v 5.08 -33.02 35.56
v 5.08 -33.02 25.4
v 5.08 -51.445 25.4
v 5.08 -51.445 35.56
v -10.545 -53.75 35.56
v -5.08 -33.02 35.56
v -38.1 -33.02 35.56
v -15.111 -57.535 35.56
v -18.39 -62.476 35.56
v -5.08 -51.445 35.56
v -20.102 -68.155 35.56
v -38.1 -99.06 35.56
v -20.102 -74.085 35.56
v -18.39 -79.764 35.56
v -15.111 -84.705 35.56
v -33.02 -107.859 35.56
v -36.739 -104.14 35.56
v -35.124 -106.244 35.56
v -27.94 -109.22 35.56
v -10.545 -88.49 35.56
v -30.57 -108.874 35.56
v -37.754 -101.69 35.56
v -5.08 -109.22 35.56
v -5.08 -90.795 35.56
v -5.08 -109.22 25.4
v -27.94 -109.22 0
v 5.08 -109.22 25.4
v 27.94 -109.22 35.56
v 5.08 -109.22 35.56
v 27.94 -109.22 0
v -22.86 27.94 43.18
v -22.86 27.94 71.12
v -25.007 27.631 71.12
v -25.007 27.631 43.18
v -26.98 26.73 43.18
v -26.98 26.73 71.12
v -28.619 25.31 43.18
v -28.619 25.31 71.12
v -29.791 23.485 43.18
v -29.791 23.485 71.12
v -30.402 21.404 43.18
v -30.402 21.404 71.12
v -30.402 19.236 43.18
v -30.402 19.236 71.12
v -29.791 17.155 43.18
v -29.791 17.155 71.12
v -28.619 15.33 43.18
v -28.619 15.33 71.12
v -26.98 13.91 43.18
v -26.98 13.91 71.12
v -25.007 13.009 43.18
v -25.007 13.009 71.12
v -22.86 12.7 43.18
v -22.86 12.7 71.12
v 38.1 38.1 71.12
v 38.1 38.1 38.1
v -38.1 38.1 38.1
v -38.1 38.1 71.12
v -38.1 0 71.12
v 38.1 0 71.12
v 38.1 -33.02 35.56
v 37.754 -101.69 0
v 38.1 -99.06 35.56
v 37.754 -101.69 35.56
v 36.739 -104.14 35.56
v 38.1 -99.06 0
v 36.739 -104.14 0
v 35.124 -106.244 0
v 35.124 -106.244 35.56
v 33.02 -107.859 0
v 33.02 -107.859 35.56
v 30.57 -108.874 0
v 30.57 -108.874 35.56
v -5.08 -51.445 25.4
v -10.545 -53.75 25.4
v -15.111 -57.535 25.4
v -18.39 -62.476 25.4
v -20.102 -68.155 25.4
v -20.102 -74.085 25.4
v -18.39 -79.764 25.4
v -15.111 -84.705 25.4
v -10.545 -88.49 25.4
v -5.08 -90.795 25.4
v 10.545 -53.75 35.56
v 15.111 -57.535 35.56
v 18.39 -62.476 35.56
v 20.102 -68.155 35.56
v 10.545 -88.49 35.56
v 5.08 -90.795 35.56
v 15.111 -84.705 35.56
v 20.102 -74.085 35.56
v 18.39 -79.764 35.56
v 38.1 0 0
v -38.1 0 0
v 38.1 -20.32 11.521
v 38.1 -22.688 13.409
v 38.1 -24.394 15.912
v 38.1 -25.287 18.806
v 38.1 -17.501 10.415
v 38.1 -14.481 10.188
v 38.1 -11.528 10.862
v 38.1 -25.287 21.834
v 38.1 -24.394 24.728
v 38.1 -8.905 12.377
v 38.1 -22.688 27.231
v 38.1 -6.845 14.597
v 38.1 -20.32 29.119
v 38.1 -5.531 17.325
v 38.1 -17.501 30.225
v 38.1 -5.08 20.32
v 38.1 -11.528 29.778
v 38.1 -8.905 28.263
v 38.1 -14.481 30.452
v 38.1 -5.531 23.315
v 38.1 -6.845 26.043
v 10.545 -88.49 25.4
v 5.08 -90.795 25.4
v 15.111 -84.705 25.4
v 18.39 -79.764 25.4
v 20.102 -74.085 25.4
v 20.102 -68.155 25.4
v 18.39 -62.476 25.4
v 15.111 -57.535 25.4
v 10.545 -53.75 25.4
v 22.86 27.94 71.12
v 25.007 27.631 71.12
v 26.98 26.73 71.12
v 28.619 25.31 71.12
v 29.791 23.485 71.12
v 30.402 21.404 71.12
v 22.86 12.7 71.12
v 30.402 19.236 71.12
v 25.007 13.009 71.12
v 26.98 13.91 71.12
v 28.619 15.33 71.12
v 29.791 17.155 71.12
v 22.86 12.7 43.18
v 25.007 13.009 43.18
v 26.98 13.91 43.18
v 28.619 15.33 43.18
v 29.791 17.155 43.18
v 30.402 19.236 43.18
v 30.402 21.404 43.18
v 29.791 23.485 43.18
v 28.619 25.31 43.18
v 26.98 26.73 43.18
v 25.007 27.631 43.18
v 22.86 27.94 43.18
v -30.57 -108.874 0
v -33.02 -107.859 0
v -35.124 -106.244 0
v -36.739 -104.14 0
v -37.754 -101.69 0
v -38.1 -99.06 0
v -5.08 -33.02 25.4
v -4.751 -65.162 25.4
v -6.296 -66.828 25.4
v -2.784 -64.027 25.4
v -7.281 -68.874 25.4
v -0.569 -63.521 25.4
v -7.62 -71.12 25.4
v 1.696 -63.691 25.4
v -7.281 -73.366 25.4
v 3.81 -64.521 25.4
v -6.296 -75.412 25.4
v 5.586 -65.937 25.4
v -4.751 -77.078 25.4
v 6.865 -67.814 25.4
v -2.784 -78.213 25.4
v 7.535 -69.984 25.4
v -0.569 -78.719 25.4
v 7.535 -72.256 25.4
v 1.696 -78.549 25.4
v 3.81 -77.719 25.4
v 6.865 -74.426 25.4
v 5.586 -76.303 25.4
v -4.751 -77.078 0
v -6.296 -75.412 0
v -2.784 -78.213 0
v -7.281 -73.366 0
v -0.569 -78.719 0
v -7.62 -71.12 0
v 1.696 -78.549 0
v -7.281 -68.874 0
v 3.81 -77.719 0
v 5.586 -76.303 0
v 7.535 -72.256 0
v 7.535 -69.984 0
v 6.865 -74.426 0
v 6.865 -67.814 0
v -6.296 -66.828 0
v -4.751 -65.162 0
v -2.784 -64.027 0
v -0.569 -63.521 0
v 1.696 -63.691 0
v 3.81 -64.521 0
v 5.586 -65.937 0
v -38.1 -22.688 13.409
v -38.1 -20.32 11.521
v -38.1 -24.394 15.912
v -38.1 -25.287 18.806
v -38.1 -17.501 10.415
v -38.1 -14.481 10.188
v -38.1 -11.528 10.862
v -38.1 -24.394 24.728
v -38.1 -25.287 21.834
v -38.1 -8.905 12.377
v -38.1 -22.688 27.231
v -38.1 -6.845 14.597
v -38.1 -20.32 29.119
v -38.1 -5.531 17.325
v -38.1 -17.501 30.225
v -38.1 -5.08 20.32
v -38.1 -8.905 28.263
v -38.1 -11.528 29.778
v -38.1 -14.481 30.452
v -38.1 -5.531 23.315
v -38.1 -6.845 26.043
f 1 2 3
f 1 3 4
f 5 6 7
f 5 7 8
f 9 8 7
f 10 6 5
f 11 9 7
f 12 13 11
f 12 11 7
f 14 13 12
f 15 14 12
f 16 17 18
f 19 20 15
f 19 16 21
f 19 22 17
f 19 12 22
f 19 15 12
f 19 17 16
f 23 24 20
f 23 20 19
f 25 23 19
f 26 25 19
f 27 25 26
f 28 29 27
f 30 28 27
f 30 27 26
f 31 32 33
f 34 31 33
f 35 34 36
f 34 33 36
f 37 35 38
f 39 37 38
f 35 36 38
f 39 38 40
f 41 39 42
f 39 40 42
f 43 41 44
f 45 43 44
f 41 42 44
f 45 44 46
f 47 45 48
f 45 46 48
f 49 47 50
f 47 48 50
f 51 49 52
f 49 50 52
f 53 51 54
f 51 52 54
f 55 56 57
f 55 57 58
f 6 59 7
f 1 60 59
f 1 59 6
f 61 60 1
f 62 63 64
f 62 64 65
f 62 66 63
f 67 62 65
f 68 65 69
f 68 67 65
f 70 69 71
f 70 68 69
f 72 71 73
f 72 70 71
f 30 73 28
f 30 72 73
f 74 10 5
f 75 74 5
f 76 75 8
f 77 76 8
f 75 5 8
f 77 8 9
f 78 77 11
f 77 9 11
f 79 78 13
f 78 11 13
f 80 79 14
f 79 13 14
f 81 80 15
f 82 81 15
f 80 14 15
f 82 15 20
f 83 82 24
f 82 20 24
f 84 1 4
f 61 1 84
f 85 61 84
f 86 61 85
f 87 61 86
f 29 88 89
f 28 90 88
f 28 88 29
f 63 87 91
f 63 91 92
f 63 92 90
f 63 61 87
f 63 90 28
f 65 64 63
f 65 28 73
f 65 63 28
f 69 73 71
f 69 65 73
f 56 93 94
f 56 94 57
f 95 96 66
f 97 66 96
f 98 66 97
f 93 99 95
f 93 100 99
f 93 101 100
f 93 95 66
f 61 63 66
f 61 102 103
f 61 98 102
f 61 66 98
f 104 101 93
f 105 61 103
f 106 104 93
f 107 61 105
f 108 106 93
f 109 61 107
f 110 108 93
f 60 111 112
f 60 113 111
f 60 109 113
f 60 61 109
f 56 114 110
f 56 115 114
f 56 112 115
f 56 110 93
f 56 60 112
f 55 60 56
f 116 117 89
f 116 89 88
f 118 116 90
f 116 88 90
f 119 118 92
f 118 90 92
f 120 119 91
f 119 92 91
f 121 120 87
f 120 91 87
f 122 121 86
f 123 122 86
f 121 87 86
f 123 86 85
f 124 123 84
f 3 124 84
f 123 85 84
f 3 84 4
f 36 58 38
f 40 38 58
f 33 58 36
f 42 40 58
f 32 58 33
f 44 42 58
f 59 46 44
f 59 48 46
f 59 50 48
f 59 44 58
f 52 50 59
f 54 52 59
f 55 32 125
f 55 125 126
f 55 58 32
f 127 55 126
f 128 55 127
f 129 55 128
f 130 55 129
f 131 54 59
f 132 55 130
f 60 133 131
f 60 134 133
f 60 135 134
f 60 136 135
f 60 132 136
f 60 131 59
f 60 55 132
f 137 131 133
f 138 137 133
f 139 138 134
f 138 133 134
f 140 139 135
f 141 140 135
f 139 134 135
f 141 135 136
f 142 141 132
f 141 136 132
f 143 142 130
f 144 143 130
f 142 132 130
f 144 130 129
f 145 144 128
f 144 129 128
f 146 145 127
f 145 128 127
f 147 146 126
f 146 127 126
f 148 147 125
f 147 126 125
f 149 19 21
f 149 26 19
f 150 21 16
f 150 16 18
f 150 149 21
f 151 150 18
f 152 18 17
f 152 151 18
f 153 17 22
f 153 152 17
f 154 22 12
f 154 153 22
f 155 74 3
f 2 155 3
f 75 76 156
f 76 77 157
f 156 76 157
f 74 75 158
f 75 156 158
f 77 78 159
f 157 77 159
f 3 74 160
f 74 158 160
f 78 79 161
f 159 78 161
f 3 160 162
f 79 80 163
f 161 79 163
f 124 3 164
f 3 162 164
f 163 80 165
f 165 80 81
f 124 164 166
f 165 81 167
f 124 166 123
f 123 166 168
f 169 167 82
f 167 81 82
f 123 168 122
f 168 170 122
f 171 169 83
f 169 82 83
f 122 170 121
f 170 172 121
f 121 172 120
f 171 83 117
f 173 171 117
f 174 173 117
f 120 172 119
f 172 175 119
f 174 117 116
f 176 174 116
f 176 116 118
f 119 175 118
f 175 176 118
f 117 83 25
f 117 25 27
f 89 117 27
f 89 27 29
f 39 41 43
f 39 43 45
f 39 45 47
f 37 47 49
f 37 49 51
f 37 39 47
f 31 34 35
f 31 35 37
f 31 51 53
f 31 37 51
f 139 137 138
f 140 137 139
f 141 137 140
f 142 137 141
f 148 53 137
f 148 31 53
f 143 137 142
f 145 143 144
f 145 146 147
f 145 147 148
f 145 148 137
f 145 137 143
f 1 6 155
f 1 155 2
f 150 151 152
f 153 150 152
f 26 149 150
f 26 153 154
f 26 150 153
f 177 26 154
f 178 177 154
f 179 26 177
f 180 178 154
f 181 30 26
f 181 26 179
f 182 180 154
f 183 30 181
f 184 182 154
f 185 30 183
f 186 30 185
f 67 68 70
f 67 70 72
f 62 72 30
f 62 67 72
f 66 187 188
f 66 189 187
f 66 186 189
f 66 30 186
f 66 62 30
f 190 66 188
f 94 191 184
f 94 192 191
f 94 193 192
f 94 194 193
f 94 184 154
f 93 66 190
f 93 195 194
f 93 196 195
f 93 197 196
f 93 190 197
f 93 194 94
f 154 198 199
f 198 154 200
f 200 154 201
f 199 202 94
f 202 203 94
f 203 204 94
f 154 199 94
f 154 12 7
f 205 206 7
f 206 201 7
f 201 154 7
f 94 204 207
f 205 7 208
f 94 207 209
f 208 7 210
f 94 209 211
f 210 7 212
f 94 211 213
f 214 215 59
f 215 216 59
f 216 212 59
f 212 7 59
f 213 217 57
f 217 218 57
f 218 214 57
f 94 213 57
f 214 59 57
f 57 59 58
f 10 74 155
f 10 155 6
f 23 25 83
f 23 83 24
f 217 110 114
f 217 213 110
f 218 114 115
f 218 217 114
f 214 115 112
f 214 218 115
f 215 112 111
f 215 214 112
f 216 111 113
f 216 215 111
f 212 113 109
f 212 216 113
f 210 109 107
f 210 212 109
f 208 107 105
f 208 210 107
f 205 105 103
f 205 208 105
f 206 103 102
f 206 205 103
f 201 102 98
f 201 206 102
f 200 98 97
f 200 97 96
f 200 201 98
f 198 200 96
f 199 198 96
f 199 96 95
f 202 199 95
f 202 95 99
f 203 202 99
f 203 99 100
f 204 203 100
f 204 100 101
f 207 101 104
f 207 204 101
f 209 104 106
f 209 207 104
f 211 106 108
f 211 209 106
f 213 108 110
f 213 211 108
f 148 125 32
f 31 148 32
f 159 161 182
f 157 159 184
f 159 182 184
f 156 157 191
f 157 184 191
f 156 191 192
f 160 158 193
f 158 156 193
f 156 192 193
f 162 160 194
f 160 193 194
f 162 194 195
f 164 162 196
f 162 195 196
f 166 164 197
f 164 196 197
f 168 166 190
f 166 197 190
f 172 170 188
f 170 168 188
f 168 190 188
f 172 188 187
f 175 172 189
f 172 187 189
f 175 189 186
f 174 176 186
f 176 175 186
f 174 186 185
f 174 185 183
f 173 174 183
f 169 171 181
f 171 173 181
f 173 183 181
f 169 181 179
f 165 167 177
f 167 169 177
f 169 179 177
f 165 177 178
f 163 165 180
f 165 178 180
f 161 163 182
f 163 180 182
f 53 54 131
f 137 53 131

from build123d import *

# Parameters (mm, degrees)
F0_R           = 10.16
F1_DEPTH       = 38.1
F3_DEPTH       = 27.94
F6_D           = 15.24
F6_CBORE_D     = 40.64
F6_CBORE_DEPTH = 10.16
F4_W           = 10.16
F4_H           = 10.16
F7_DEPTH       = 76.2
F8_R           = 10.16


with BuildPart() as f1:
    # F0 (on Right) → F1 (new body, symmetric)
    with BuildSketch(Plane.YZ):
        Polygon((-109.22, 0), (0, 0), (38.1, 38.1), (38.1, 71.12), (0, 71.12), (-33.02, 35.56), (-109.22, 35.56), align=None)
        with Locations((-15.24, 20.32)):
            Circle(F0_R, mode=Mode.SUBTRACT)
    extrude(amount=F1_DEPTH, both=True)

    # F2 (on face) → F3 (cut)
    with BuildSketch(Plane.XY.offset(71.12)):
        with BuildLine():
            Line((22.86, 27.94), (-22.86, 27.94))
            ThreePointArc((-22.86, 27.94), (-30.48, 20.32), (-22.86, 12.7))
            Line((-22.86, 12.7), (22.86, 12.7))
            ThreePointArc((22.86, 12.7), (30.48, 20.32), (22.86, 27.94))
        make_face()
    extrude(amount=-F3_DEPTH, mode=Mode.SUBTRACT)

    # F6 (through all)
    with Locations(Plane.XY.offset(35.56)):
        with Locations((0, -71.12)):
            CounterBoreHole(F6_D / 2, F6_CBORE_D / 2, F6_CBORE_DEPTH)

    # F4 (on face) → F7 (cut)
    with BuildSketch(Plane.XZ.offset(109.22)):
        with Locations((0, 30.48)):
            Rectangle(F4_W, F4_H)
    extrude(amount=-F7_DEPTH, mode=Mode.SUBTRACT)

    # F8
    f8_edges = [f1.edges().sort_by_distance(p)[0] for p in [
        (-38.1, -109.22, 17.78),
        (38.1, -109.22, 17.78),
    ]]
    fillet(f8_edges, radius=F8_R)


solid = f1.part
